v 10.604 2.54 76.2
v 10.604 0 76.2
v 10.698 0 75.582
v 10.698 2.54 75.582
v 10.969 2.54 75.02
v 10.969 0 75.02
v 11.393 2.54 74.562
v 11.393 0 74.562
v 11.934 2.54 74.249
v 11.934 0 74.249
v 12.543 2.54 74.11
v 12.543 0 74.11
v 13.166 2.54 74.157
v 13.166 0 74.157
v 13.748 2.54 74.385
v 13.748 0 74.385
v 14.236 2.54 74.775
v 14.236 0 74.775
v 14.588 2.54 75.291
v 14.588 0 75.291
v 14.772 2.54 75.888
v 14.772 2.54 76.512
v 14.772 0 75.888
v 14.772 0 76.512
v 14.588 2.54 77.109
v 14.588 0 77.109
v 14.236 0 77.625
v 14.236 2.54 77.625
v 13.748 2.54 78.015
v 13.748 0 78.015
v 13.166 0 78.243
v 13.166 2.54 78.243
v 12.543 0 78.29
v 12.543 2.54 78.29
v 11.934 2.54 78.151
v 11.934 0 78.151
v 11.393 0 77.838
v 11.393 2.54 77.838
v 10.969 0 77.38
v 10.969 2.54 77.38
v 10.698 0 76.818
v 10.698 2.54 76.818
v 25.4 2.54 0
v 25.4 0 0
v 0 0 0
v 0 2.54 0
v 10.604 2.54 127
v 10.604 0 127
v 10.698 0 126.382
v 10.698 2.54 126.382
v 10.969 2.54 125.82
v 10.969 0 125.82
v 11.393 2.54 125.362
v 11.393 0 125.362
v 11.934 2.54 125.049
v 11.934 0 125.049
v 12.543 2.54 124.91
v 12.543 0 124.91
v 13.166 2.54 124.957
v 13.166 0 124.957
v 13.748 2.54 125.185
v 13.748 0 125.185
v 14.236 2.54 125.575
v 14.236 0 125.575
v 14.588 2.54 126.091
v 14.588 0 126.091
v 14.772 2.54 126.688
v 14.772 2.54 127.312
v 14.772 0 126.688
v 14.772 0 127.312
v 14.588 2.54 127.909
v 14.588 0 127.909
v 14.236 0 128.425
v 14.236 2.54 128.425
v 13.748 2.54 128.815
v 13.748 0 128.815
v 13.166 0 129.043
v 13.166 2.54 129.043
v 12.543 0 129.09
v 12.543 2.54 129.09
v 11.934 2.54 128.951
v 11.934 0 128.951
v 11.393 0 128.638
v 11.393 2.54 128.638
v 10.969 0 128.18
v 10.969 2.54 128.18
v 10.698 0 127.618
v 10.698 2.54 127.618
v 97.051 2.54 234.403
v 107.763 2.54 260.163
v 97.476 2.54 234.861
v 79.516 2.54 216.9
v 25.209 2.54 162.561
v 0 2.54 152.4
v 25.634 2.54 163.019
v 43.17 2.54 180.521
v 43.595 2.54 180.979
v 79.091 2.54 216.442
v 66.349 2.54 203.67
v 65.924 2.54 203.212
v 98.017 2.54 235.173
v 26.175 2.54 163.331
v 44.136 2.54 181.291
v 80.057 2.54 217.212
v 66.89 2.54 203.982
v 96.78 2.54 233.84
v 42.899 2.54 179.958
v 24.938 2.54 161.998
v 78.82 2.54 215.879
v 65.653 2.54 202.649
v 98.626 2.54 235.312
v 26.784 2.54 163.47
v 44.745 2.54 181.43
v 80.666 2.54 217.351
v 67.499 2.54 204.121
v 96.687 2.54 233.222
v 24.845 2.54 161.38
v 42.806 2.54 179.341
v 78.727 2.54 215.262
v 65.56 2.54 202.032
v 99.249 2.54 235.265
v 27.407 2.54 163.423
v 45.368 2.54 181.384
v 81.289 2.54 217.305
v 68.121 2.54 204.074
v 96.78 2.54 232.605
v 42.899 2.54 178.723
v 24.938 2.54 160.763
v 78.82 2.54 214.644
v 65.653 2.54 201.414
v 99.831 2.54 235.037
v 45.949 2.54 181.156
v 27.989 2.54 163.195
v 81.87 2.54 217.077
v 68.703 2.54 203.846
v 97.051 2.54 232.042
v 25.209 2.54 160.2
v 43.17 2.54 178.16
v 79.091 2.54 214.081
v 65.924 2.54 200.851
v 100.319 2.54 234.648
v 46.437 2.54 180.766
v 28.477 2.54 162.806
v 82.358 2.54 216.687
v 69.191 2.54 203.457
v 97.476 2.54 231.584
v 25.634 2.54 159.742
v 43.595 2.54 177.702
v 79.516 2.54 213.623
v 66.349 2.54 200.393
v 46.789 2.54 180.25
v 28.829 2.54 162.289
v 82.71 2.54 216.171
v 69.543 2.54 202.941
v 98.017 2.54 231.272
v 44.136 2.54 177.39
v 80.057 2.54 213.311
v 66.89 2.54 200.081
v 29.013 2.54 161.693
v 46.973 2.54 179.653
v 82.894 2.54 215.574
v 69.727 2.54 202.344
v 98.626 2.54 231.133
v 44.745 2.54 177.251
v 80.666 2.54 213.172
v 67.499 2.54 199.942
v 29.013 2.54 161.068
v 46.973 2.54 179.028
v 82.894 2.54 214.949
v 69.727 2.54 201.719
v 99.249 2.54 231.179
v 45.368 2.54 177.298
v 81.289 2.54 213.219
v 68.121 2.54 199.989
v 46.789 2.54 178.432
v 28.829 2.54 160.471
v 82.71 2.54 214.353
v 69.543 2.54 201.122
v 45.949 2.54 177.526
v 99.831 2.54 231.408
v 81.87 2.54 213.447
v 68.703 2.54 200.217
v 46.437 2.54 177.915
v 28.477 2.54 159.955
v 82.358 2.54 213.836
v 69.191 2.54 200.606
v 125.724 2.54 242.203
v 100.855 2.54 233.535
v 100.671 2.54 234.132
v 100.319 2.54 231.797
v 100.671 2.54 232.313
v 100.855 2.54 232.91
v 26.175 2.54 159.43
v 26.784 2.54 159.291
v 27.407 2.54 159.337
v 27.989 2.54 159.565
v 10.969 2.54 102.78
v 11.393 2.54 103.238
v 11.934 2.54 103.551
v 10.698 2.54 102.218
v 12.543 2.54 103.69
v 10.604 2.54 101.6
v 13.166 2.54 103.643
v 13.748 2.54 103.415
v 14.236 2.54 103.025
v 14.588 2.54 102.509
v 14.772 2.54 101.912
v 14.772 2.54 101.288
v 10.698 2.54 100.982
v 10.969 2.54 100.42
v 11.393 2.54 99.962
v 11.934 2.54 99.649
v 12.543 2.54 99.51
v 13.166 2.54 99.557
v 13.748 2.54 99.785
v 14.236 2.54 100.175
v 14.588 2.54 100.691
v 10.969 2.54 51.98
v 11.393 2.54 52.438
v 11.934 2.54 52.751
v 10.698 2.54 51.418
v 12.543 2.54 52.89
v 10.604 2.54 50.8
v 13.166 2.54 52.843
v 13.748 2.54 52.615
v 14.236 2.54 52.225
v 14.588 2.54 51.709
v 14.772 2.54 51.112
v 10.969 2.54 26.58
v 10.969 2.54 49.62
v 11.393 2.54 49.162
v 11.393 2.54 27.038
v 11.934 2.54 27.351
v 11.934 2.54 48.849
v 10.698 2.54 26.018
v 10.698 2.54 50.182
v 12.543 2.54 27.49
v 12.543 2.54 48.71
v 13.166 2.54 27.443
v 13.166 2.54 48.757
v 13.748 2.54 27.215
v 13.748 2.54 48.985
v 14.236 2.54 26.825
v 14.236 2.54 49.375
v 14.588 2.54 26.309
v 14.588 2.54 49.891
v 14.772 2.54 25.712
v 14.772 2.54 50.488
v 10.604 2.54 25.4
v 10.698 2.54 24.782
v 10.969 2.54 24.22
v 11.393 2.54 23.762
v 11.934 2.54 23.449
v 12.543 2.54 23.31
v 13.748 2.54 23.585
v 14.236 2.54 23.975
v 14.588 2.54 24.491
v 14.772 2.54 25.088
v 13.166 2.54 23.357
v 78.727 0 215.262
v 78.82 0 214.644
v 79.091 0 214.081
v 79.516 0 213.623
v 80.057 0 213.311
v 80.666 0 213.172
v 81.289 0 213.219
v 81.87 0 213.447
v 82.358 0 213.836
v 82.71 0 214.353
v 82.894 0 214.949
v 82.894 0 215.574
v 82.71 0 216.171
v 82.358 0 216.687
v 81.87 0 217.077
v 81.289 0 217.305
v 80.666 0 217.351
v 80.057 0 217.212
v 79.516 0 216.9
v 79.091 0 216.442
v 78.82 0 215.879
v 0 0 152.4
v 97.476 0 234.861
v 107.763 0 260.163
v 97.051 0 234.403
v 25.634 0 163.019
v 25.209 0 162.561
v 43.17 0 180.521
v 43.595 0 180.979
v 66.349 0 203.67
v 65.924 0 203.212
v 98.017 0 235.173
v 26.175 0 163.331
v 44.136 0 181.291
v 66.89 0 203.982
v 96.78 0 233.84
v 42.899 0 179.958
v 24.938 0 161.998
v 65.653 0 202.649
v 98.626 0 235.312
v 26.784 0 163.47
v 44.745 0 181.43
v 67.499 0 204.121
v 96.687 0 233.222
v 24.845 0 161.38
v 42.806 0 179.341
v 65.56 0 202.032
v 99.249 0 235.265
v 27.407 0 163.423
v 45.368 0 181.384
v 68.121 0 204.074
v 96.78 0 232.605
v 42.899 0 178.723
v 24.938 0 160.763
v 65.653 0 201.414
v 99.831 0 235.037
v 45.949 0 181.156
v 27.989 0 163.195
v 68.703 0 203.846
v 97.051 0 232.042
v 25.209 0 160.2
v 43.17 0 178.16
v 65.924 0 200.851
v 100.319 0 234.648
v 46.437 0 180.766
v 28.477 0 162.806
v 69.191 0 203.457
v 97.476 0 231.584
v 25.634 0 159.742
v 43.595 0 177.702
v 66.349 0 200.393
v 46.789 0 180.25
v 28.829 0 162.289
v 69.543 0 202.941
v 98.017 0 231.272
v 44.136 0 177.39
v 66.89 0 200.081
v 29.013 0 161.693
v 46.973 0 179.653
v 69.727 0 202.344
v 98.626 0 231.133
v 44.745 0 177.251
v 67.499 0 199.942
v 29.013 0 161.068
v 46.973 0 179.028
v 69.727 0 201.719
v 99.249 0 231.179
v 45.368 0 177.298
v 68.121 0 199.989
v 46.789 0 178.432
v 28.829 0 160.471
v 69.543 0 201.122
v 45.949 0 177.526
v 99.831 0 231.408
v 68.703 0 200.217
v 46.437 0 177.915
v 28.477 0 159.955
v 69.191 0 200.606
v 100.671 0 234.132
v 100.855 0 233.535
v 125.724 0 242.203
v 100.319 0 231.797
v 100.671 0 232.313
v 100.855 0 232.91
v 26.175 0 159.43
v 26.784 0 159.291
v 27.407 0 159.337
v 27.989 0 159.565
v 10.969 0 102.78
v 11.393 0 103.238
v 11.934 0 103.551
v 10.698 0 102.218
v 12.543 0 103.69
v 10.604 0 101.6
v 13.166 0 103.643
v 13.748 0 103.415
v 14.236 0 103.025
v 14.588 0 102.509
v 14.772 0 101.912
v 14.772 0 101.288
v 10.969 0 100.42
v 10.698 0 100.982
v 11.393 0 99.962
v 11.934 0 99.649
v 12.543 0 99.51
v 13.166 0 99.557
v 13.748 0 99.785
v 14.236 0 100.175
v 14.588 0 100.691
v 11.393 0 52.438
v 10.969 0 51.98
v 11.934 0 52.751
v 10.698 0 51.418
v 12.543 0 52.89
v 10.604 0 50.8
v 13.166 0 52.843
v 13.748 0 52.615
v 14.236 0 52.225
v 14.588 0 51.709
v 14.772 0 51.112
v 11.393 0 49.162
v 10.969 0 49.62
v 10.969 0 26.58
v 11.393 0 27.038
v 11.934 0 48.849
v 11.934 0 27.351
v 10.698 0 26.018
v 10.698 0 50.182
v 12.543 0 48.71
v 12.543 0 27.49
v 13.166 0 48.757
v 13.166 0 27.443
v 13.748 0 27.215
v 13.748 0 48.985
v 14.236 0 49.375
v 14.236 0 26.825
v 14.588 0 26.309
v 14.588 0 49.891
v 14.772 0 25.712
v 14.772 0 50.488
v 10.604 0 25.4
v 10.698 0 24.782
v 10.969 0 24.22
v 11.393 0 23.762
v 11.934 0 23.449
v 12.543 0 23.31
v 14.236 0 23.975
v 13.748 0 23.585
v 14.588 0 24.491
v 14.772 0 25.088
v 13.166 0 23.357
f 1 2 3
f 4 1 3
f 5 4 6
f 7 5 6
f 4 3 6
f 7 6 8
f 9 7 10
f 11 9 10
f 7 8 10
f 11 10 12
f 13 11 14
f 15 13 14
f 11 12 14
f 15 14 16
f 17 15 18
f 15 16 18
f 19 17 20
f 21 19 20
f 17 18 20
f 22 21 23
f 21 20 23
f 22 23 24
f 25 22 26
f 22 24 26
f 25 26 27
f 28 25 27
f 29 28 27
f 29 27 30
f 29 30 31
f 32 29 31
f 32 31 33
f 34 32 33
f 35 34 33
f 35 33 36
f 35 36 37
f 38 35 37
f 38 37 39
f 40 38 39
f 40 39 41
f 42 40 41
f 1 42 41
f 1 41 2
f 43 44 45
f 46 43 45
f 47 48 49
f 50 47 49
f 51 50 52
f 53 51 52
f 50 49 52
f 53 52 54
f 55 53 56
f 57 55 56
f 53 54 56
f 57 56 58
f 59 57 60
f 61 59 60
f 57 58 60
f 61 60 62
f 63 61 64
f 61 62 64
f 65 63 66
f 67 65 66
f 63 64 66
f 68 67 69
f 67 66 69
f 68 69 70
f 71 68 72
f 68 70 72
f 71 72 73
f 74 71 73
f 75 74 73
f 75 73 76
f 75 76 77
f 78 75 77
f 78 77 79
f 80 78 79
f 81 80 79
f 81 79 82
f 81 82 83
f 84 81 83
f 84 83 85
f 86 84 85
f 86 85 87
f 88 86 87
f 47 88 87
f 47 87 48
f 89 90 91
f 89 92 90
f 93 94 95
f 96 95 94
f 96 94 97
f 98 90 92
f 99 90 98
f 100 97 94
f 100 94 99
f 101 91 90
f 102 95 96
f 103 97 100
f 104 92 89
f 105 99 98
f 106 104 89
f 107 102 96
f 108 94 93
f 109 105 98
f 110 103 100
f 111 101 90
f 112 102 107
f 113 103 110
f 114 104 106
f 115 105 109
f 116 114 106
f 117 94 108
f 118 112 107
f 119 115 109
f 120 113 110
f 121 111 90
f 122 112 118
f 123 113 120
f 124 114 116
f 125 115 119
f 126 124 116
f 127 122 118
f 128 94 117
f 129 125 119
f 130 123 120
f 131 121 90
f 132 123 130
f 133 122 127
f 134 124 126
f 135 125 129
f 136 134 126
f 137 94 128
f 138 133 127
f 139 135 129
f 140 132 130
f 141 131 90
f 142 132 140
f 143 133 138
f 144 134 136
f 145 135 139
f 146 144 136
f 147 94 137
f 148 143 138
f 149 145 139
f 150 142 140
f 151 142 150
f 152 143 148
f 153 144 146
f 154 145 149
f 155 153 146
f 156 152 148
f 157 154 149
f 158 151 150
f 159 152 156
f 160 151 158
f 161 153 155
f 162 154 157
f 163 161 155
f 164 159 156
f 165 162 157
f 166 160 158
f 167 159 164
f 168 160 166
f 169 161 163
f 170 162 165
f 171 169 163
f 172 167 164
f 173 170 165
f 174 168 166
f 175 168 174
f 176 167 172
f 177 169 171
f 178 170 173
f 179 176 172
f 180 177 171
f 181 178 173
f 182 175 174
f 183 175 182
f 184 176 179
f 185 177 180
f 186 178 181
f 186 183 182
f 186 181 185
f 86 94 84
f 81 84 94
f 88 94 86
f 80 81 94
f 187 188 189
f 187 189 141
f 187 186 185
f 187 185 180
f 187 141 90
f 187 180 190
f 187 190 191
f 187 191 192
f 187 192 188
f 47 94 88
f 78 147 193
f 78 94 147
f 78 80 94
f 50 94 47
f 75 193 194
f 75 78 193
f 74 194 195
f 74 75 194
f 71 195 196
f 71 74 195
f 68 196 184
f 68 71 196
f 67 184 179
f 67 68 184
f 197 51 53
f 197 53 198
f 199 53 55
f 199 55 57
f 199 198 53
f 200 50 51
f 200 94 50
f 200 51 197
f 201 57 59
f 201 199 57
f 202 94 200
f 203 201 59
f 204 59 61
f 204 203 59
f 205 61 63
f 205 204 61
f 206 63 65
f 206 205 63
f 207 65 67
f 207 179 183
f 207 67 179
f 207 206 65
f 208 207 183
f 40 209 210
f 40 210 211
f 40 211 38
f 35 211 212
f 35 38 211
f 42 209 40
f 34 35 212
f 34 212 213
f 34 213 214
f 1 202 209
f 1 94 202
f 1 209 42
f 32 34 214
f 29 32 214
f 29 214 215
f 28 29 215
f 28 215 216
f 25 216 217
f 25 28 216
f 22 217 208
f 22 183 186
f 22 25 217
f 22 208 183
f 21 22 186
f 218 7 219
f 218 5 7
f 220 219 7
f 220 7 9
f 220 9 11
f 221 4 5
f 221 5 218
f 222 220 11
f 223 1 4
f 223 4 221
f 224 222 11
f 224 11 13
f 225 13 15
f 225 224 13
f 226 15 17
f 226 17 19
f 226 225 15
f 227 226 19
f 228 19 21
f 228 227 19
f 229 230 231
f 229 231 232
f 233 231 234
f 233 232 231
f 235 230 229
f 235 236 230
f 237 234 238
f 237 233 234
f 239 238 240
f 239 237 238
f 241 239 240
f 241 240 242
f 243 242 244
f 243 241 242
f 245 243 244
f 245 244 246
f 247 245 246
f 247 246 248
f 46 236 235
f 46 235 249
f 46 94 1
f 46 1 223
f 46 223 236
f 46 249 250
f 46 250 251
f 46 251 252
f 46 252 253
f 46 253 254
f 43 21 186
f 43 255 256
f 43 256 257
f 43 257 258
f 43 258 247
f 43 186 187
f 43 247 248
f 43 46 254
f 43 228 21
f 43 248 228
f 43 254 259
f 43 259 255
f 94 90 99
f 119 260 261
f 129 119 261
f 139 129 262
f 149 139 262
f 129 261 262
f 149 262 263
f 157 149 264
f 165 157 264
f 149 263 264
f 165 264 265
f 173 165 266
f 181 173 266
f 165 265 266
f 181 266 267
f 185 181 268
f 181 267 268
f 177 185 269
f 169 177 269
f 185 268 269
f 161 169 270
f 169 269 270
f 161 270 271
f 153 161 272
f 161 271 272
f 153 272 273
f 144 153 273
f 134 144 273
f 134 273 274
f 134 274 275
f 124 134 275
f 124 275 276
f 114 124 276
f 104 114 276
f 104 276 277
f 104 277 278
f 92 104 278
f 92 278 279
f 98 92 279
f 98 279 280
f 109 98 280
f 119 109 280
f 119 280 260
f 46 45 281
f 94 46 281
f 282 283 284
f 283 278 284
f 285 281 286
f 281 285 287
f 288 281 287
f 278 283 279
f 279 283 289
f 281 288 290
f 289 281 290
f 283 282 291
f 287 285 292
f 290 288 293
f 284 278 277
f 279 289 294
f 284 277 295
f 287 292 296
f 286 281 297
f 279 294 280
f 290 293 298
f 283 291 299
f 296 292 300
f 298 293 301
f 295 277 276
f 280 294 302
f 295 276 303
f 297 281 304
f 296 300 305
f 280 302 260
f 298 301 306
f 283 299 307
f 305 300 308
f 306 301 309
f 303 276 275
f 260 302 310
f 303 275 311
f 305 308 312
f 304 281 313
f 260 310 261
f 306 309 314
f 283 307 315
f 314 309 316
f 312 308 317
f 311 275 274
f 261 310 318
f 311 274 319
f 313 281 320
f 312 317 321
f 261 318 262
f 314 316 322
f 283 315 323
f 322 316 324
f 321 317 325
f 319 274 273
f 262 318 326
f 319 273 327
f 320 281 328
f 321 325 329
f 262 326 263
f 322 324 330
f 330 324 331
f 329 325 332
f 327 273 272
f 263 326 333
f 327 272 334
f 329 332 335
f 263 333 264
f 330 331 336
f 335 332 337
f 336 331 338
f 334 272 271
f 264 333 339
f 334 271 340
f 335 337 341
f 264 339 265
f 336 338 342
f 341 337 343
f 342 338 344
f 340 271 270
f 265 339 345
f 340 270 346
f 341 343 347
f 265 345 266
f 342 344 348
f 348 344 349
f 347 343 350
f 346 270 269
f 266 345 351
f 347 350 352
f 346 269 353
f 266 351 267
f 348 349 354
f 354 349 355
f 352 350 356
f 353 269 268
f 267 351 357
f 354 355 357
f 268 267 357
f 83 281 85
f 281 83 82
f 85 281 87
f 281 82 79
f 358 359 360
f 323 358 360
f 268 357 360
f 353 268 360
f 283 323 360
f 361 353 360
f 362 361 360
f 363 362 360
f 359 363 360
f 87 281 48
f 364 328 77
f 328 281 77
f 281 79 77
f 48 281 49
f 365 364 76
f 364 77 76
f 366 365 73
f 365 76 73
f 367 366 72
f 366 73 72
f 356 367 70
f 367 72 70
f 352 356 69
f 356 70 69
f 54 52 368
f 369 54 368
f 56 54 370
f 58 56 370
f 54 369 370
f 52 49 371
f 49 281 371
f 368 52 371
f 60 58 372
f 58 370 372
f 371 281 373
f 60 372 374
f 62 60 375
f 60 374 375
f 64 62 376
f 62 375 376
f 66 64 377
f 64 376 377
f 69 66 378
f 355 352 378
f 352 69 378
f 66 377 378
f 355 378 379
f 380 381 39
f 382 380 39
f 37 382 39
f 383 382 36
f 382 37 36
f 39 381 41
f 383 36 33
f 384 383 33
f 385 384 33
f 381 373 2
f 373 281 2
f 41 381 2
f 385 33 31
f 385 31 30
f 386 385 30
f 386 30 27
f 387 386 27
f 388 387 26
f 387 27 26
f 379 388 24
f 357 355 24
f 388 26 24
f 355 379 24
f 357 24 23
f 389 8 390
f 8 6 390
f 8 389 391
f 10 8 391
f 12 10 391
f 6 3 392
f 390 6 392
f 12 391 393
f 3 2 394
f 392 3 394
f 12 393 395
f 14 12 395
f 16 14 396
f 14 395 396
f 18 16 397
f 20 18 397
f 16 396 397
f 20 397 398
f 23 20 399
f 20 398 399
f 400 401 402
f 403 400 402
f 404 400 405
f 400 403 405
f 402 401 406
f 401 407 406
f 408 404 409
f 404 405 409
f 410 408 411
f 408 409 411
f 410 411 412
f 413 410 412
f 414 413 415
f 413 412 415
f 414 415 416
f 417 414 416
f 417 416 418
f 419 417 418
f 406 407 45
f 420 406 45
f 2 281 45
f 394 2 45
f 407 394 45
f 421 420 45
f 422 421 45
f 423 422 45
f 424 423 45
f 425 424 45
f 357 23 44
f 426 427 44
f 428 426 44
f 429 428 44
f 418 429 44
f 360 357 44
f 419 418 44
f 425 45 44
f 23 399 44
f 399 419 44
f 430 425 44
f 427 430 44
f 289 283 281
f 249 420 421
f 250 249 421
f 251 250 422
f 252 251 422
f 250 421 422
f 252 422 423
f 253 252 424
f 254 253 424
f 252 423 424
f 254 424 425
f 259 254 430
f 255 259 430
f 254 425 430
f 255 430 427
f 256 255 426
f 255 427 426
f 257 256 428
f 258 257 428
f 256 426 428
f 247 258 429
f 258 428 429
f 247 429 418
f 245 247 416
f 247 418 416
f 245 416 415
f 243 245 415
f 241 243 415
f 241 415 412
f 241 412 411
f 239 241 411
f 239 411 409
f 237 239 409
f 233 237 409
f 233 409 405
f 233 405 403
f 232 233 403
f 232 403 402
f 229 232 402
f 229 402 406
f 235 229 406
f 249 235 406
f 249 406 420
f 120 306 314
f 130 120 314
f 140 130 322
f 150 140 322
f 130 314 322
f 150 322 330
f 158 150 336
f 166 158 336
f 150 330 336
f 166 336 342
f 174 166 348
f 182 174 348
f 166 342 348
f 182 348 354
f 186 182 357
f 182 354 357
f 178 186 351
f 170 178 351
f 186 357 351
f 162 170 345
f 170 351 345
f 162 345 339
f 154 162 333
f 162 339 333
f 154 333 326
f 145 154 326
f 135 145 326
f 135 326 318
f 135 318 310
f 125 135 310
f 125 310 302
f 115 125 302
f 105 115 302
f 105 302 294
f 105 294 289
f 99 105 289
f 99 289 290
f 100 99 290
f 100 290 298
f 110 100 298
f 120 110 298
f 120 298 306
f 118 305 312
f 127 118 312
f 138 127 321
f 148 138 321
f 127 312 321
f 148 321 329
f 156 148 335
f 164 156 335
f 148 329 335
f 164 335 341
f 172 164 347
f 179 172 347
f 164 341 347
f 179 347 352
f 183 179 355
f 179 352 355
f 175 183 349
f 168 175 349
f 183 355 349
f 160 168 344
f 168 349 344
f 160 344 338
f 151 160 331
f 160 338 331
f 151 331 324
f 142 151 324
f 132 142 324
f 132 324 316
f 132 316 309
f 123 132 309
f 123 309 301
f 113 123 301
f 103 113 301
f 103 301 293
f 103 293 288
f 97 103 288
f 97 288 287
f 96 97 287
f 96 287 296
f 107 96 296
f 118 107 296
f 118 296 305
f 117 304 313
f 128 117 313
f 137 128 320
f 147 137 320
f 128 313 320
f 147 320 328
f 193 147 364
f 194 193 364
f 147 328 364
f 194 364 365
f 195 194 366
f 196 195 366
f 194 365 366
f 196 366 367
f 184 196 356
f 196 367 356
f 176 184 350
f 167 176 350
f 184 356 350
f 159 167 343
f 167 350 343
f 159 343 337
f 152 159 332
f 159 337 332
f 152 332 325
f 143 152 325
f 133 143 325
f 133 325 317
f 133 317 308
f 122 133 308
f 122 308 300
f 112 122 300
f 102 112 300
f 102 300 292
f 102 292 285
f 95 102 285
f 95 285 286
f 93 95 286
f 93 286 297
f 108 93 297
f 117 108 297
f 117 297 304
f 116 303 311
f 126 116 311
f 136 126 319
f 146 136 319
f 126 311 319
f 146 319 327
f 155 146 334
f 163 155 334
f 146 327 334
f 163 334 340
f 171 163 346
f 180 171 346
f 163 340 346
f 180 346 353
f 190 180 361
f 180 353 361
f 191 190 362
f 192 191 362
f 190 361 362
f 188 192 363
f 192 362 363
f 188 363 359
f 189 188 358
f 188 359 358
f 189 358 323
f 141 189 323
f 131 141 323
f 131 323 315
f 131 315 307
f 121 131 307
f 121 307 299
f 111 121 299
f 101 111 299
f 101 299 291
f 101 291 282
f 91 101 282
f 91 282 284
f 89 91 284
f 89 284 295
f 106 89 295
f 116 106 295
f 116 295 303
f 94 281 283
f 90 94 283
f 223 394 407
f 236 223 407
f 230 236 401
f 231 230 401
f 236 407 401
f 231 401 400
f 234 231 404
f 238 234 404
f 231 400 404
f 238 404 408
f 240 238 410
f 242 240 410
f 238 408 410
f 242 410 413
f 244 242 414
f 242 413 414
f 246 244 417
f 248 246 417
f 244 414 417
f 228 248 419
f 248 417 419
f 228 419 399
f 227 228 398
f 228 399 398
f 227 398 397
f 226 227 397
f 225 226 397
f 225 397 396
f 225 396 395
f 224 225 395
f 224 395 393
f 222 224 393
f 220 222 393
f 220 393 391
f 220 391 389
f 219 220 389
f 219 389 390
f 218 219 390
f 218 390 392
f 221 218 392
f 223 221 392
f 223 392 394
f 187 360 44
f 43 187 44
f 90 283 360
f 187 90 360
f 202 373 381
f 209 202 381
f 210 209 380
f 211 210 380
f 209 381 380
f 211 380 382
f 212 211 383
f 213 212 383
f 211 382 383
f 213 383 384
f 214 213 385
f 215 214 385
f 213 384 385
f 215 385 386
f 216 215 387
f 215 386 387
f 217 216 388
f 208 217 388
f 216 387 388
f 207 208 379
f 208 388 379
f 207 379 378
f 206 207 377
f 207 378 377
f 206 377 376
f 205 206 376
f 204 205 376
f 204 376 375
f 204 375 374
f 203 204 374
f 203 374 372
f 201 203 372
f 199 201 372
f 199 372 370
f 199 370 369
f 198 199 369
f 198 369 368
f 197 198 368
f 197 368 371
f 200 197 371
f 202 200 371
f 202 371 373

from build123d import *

# Parameters (mm, degrees)
BOSS_EXTRUDE1_DEPTH        = 2.54
F_8_0_199_DIAMETER_HOLE1_D = 4.191


with BuildPart() as part:
    # Sketch1 → Boss-Extrude1 (new body)
    with BuildSketch(Plane(origin=(0, 0, 0), x_dir=(1, 0, 0), z_dir=(0, 1, 0))):
        Polygon((0, 0), (0, -152.4), (107.763073453, -260.163073453), (125.723585695, -242.202561211), (25.4, 0), align=None)
    extrude(amount=BOSS_EXTRUDE1_DEPTH)

    # #8 (0.199) Diameter Hole1 (through all)
    with Locations(Plane(origin=(0, 2.54, 0), x_dir=(1, 0, 0), z_dir=(0, 1, 0))):
        with Locations((12.7, -25.4), (12.7, -50.8), (12.7, -76.2), (12.7, -101.6), (12.7, -127), (26.940768363, -161.380256121), (44.901280605, -179.340768363), (67.655118698, -202.03150109), (80.82230509, -215.261792847), (98.782817332, -233.22230509)):
            Hole(F_8_0_199_DIAMETER_HOLE1_D / 2)


solid = part.part
